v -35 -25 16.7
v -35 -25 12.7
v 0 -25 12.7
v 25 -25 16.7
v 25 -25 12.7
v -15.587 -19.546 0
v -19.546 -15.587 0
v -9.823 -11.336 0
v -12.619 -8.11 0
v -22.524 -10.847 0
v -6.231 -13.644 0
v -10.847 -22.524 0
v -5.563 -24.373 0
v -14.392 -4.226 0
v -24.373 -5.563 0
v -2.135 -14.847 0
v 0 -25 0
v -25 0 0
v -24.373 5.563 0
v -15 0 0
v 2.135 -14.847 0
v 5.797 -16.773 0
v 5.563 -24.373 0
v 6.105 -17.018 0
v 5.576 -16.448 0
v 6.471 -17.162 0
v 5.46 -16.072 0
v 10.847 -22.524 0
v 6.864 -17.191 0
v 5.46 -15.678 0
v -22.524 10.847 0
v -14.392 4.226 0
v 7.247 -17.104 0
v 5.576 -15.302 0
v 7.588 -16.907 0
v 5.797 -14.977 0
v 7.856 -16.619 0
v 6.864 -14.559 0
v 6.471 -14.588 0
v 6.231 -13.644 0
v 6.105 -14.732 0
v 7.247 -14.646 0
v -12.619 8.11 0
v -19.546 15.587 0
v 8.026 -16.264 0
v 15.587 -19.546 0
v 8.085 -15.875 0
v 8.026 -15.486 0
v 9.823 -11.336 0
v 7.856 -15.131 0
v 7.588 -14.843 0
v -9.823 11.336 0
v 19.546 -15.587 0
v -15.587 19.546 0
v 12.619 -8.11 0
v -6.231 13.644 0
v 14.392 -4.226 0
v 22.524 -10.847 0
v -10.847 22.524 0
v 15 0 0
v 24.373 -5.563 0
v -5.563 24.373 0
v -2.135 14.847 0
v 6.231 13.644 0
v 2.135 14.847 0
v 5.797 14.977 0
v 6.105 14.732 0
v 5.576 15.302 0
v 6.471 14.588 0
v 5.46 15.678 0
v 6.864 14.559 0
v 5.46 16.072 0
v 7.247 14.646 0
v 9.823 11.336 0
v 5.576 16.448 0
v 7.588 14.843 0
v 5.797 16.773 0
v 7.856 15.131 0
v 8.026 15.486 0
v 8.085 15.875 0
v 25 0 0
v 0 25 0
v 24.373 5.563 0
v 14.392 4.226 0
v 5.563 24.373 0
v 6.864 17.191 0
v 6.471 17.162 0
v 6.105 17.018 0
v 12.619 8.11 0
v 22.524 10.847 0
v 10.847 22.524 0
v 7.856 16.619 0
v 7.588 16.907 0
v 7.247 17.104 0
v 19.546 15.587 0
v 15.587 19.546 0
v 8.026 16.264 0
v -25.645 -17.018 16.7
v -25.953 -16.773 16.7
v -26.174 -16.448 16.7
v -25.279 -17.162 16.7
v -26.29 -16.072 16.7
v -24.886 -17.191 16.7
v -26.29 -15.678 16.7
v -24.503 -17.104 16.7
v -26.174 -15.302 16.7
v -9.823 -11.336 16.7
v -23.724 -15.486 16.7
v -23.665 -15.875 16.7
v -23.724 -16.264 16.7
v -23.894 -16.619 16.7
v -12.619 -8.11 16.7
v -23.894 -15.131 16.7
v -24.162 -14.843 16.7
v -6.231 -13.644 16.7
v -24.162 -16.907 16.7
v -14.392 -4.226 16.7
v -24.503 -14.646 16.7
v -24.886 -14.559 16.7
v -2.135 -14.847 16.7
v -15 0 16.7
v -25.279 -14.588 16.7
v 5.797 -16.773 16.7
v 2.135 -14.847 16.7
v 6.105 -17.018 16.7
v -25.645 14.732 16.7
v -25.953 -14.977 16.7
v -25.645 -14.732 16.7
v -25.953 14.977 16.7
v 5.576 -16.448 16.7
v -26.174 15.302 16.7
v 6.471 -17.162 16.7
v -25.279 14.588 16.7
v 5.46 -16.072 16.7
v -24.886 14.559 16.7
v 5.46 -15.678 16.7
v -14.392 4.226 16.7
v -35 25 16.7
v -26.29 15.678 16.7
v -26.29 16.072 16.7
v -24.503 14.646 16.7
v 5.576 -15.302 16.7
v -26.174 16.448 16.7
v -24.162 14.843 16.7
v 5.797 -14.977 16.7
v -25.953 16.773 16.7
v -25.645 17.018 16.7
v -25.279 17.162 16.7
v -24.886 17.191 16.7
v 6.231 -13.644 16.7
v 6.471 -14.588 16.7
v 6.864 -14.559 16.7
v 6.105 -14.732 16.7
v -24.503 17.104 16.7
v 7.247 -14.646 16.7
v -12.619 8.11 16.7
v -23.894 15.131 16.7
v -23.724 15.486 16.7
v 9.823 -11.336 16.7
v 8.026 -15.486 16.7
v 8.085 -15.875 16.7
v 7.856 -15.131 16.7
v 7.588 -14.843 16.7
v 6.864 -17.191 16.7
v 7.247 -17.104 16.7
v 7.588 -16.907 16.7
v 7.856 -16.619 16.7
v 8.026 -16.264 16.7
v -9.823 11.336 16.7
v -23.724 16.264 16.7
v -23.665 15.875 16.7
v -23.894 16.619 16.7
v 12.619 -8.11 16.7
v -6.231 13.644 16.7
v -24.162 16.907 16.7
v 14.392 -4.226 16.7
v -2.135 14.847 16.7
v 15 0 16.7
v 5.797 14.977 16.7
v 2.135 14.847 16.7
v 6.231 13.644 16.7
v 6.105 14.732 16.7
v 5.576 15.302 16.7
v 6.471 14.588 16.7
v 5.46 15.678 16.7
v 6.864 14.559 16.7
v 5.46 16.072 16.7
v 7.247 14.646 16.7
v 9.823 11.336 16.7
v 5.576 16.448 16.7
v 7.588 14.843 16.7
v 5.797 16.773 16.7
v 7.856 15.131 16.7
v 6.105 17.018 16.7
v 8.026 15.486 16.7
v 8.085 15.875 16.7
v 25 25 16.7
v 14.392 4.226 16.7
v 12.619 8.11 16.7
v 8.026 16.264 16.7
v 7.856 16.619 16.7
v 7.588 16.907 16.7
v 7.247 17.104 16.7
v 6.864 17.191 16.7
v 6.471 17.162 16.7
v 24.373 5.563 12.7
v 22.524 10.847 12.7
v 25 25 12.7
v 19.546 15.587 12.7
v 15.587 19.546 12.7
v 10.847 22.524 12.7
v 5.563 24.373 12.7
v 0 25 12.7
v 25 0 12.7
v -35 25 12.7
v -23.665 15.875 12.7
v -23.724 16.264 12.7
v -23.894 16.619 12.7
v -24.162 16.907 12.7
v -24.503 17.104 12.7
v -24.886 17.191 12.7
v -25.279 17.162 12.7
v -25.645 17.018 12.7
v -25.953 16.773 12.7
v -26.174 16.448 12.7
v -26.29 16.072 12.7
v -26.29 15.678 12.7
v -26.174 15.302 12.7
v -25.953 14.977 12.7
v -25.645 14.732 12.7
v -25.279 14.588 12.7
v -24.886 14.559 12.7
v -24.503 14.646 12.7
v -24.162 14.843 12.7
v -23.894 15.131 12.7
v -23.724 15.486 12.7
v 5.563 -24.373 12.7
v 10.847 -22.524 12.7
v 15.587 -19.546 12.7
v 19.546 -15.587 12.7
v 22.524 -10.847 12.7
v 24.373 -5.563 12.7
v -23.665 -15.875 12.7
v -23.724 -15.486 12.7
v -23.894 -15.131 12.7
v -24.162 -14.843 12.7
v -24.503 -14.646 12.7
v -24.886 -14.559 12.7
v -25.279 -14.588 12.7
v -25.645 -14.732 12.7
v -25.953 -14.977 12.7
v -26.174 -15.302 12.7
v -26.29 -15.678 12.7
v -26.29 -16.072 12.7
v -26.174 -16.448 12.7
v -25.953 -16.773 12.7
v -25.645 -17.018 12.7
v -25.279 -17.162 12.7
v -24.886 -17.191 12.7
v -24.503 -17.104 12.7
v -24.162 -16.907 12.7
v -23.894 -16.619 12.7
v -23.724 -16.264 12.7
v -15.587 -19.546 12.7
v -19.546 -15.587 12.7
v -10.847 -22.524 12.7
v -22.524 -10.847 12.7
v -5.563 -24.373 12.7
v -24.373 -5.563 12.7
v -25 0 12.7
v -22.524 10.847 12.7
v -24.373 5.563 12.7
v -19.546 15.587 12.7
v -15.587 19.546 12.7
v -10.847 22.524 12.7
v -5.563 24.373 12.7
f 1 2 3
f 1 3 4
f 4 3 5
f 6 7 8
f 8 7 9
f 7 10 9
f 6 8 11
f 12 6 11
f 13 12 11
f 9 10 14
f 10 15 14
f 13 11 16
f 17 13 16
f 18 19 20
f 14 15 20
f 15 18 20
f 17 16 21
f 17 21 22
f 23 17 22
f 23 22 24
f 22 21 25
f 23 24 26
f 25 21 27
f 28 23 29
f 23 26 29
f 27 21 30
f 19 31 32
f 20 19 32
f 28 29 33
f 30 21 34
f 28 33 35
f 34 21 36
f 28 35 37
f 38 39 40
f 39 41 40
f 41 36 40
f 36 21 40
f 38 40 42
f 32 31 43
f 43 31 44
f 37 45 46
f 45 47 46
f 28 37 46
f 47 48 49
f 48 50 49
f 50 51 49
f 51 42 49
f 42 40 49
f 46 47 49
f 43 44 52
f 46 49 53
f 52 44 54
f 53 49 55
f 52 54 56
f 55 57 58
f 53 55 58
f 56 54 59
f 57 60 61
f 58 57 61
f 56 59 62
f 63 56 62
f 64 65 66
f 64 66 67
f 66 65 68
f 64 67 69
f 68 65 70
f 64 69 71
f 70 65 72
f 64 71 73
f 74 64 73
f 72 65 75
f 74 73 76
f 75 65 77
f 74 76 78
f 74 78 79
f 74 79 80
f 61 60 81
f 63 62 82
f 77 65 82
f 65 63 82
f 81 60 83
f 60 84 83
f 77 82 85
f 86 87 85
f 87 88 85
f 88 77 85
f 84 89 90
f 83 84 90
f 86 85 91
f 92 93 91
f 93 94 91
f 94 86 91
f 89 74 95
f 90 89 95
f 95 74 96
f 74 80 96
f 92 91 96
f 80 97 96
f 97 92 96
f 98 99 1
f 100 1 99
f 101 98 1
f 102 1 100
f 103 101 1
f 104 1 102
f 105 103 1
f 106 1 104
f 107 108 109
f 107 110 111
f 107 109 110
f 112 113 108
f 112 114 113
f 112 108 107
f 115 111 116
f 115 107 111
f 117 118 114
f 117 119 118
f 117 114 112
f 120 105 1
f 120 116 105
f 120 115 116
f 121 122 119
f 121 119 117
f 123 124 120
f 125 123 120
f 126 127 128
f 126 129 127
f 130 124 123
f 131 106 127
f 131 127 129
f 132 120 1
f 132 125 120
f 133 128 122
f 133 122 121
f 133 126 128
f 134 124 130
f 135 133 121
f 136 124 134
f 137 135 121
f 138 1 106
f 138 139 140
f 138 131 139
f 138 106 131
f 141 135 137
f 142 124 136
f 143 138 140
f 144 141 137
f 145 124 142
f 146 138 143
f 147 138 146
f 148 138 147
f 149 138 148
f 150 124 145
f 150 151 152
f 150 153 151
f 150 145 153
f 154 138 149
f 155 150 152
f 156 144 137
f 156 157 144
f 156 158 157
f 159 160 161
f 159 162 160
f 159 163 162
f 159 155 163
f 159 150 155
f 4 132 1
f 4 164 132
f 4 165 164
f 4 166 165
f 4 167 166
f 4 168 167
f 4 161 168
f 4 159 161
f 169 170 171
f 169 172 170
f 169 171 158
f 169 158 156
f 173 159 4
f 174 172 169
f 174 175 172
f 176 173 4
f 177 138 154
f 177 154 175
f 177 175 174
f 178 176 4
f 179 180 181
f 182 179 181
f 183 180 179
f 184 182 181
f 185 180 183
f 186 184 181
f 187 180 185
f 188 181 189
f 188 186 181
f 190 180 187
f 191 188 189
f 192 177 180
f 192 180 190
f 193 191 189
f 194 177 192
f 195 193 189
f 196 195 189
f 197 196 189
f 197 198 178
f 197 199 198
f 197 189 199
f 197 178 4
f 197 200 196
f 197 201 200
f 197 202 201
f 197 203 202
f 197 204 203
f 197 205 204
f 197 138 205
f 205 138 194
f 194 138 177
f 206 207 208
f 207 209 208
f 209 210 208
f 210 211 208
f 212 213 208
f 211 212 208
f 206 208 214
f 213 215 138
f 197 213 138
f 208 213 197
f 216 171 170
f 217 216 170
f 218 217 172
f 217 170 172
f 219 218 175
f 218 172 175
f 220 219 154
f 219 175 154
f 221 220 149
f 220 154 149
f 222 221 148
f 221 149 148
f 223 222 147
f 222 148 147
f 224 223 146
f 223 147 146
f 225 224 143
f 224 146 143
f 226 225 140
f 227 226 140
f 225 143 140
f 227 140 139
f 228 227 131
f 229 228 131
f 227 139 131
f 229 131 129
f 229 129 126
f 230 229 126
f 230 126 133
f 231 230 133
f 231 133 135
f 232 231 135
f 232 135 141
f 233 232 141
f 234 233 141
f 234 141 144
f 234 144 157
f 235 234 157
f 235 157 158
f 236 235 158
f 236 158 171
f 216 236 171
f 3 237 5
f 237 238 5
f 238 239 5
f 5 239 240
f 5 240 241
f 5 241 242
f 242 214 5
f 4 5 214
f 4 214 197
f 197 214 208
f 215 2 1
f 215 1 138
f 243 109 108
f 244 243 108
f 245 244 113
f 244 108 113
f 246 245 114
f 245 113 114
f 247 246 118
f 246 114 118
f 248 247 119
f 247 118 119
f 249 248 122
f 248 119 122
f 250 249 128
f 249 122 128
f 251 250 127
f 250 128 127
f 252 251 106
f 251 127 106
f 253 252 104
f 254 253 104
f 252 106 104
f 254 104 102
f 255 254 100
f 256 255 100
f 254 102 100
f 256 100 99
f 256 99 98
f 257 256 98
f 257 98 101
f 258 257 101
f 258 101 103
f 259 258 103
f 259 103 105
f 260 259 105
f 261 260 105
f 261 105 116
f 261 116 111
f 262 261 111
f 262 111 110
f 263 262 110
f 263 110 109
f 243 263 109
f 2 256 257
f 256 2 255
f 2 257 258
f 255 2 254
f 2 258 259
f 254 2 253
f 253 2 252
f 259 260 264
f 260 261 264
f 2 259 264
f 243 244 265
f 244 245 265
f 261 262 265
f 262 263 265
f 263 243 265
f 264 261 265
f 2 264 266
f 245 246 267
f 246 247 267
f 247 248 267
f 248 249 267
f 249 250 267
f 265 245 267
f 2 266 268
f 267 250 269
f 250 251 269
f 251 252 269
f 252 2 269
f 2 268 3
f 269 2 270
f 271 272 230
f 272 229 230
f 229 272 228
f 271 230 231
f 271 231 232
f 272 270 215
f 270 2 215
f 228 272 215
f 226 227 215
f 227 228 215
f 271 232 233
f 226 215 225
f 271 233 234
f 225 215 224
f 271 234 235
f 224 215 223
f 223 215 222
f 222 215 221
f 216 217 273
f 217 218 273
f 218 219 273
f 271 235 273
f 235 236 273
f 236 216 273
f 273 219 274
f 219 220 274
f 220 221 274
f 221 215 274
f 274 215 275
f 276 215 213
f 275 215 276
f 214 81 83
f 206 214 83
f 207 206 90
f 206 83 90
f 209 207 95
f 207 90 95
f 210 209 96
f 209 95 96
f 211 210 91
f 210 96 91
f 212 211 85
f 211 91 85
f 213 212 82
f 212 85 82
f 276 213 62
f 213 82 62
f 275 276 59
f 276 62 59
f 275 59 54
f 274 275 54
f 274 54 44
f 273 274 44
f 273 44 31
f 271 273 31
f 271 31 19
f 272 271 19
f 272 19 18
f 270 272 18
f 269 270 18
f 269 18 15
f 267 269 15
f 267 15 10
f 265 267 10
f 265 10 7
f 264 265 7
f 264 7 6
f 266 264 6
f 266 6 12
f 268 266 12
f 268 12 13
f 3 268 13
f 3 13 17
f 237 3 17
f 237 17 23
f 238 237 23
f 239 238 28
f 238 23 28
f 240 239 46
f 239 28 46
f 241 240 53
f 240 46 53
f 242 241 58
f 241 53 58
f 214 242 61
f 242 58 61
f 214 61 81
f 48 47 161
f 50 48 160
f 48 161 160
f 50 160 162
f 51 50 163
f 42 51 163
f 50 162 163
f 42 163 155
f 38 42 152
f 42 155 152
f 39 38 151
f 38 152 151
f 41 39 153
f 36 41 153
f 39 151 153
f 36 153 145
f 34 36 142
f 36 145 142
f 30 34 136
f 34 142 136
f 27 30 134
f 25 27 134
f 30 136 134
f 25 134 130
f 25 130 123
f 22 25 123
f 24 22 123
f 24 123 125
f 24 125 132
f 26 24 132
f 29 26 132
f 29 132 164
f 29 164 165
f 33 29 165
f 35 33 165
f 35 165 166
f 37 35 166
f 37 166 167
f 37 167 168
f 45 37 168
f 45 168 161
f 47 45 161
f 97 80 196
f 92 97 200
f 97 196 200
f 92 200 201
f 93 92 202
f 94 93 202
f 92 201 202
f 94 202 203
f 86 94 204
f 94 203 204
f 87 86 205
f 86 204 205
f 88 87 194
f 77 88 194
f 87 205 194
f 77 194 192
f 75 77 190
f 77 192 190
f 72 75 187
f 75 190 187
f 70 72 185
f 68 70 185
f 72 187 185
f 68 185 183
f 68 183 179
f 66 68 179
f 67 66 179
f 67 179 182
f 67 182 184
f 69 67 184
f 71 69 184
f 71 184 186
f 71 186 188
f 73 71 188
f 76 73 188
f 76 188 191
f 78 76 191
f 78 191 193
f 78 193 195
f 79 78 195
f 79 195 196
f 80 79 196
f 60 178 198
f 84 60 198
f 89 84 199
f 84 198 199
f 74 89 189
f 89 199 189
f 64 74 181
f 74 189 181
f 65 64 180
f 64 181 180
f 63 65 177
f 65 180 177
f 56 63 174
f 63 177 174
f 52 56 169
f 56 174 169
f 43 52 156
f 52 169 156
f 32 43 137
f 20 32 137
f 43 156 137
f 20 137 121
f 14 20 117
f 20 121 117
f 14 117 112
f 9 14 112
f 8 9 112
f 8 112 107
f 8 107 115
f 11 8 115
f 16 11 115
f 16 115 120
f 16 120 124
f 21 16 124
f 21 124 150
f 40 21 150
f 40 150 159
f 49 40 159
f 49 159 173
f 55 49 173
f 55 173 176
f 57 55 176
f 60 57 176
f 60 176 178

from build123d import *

# Parameters (mm, degrees)
SKETCH1_R           = 25
BOSS_EXTRUDE1_DEPTH = 12.7
SKETCH2_W           = 60
SKETCH2_H           = 50
BOSS_EXTRUDE2_DEPTH = 4
SKETCH3_R           = 1.32
CUT_EXTRUDE1_DEPTH  = 17.7
SKETCH4_R           = 15
CUT_EXTRUDE2_DEPTH  = 17.7


with BuildPart() as part:
    # Sketch1 → Boss-Extrude1 (new body)
    with BuildSketch(Plane.XY):
        Circle(SKETCH1_R)
    extrude(amount=BOSS_EXTRUDE1_DEPTH)

    # Sketch2 → Boss-Extrude2 (add)
    with BuildSketch(Plane.XY.offset(12.7)):
        with Locations((-5, 0)):
            Rectangle(SKETCH2_W, SKETCH2_H)
    extrude(amount=BOSS_EXTRUDE2_DEPTH)

    # Sketch3 → Cut-Extrude1 (cut, through all)
    with BuildSketch(Plane.XY.offset(16.7)):
        with Locations((-24.985, 15.875)):
            Circle(SKETCH3_R)
        with Locations((6.765, 15.875)):
            Circle(SKETCH3_R)
        with Locations((6.765, -15.875)):
            Circle(SKETCH3_R)
        with Locations((-24.985, -15.875)):
            Circle(SKETCH3_R)
    extrude(amount=-CUT_EXTRUDE1_DEPTH, mode=Mode.SUBTRACT)

    # Sketch4 → Cut-Extrude2 (cut, through all)
    with BuildSketch(Plane.XY.offset(16.7)):
        Circle(SKETCH4_R)
    extrude(amount=-CUT_EXTRUDE2_DEPTH, mode=Mode.SUBTRACT)


solid = part.part
